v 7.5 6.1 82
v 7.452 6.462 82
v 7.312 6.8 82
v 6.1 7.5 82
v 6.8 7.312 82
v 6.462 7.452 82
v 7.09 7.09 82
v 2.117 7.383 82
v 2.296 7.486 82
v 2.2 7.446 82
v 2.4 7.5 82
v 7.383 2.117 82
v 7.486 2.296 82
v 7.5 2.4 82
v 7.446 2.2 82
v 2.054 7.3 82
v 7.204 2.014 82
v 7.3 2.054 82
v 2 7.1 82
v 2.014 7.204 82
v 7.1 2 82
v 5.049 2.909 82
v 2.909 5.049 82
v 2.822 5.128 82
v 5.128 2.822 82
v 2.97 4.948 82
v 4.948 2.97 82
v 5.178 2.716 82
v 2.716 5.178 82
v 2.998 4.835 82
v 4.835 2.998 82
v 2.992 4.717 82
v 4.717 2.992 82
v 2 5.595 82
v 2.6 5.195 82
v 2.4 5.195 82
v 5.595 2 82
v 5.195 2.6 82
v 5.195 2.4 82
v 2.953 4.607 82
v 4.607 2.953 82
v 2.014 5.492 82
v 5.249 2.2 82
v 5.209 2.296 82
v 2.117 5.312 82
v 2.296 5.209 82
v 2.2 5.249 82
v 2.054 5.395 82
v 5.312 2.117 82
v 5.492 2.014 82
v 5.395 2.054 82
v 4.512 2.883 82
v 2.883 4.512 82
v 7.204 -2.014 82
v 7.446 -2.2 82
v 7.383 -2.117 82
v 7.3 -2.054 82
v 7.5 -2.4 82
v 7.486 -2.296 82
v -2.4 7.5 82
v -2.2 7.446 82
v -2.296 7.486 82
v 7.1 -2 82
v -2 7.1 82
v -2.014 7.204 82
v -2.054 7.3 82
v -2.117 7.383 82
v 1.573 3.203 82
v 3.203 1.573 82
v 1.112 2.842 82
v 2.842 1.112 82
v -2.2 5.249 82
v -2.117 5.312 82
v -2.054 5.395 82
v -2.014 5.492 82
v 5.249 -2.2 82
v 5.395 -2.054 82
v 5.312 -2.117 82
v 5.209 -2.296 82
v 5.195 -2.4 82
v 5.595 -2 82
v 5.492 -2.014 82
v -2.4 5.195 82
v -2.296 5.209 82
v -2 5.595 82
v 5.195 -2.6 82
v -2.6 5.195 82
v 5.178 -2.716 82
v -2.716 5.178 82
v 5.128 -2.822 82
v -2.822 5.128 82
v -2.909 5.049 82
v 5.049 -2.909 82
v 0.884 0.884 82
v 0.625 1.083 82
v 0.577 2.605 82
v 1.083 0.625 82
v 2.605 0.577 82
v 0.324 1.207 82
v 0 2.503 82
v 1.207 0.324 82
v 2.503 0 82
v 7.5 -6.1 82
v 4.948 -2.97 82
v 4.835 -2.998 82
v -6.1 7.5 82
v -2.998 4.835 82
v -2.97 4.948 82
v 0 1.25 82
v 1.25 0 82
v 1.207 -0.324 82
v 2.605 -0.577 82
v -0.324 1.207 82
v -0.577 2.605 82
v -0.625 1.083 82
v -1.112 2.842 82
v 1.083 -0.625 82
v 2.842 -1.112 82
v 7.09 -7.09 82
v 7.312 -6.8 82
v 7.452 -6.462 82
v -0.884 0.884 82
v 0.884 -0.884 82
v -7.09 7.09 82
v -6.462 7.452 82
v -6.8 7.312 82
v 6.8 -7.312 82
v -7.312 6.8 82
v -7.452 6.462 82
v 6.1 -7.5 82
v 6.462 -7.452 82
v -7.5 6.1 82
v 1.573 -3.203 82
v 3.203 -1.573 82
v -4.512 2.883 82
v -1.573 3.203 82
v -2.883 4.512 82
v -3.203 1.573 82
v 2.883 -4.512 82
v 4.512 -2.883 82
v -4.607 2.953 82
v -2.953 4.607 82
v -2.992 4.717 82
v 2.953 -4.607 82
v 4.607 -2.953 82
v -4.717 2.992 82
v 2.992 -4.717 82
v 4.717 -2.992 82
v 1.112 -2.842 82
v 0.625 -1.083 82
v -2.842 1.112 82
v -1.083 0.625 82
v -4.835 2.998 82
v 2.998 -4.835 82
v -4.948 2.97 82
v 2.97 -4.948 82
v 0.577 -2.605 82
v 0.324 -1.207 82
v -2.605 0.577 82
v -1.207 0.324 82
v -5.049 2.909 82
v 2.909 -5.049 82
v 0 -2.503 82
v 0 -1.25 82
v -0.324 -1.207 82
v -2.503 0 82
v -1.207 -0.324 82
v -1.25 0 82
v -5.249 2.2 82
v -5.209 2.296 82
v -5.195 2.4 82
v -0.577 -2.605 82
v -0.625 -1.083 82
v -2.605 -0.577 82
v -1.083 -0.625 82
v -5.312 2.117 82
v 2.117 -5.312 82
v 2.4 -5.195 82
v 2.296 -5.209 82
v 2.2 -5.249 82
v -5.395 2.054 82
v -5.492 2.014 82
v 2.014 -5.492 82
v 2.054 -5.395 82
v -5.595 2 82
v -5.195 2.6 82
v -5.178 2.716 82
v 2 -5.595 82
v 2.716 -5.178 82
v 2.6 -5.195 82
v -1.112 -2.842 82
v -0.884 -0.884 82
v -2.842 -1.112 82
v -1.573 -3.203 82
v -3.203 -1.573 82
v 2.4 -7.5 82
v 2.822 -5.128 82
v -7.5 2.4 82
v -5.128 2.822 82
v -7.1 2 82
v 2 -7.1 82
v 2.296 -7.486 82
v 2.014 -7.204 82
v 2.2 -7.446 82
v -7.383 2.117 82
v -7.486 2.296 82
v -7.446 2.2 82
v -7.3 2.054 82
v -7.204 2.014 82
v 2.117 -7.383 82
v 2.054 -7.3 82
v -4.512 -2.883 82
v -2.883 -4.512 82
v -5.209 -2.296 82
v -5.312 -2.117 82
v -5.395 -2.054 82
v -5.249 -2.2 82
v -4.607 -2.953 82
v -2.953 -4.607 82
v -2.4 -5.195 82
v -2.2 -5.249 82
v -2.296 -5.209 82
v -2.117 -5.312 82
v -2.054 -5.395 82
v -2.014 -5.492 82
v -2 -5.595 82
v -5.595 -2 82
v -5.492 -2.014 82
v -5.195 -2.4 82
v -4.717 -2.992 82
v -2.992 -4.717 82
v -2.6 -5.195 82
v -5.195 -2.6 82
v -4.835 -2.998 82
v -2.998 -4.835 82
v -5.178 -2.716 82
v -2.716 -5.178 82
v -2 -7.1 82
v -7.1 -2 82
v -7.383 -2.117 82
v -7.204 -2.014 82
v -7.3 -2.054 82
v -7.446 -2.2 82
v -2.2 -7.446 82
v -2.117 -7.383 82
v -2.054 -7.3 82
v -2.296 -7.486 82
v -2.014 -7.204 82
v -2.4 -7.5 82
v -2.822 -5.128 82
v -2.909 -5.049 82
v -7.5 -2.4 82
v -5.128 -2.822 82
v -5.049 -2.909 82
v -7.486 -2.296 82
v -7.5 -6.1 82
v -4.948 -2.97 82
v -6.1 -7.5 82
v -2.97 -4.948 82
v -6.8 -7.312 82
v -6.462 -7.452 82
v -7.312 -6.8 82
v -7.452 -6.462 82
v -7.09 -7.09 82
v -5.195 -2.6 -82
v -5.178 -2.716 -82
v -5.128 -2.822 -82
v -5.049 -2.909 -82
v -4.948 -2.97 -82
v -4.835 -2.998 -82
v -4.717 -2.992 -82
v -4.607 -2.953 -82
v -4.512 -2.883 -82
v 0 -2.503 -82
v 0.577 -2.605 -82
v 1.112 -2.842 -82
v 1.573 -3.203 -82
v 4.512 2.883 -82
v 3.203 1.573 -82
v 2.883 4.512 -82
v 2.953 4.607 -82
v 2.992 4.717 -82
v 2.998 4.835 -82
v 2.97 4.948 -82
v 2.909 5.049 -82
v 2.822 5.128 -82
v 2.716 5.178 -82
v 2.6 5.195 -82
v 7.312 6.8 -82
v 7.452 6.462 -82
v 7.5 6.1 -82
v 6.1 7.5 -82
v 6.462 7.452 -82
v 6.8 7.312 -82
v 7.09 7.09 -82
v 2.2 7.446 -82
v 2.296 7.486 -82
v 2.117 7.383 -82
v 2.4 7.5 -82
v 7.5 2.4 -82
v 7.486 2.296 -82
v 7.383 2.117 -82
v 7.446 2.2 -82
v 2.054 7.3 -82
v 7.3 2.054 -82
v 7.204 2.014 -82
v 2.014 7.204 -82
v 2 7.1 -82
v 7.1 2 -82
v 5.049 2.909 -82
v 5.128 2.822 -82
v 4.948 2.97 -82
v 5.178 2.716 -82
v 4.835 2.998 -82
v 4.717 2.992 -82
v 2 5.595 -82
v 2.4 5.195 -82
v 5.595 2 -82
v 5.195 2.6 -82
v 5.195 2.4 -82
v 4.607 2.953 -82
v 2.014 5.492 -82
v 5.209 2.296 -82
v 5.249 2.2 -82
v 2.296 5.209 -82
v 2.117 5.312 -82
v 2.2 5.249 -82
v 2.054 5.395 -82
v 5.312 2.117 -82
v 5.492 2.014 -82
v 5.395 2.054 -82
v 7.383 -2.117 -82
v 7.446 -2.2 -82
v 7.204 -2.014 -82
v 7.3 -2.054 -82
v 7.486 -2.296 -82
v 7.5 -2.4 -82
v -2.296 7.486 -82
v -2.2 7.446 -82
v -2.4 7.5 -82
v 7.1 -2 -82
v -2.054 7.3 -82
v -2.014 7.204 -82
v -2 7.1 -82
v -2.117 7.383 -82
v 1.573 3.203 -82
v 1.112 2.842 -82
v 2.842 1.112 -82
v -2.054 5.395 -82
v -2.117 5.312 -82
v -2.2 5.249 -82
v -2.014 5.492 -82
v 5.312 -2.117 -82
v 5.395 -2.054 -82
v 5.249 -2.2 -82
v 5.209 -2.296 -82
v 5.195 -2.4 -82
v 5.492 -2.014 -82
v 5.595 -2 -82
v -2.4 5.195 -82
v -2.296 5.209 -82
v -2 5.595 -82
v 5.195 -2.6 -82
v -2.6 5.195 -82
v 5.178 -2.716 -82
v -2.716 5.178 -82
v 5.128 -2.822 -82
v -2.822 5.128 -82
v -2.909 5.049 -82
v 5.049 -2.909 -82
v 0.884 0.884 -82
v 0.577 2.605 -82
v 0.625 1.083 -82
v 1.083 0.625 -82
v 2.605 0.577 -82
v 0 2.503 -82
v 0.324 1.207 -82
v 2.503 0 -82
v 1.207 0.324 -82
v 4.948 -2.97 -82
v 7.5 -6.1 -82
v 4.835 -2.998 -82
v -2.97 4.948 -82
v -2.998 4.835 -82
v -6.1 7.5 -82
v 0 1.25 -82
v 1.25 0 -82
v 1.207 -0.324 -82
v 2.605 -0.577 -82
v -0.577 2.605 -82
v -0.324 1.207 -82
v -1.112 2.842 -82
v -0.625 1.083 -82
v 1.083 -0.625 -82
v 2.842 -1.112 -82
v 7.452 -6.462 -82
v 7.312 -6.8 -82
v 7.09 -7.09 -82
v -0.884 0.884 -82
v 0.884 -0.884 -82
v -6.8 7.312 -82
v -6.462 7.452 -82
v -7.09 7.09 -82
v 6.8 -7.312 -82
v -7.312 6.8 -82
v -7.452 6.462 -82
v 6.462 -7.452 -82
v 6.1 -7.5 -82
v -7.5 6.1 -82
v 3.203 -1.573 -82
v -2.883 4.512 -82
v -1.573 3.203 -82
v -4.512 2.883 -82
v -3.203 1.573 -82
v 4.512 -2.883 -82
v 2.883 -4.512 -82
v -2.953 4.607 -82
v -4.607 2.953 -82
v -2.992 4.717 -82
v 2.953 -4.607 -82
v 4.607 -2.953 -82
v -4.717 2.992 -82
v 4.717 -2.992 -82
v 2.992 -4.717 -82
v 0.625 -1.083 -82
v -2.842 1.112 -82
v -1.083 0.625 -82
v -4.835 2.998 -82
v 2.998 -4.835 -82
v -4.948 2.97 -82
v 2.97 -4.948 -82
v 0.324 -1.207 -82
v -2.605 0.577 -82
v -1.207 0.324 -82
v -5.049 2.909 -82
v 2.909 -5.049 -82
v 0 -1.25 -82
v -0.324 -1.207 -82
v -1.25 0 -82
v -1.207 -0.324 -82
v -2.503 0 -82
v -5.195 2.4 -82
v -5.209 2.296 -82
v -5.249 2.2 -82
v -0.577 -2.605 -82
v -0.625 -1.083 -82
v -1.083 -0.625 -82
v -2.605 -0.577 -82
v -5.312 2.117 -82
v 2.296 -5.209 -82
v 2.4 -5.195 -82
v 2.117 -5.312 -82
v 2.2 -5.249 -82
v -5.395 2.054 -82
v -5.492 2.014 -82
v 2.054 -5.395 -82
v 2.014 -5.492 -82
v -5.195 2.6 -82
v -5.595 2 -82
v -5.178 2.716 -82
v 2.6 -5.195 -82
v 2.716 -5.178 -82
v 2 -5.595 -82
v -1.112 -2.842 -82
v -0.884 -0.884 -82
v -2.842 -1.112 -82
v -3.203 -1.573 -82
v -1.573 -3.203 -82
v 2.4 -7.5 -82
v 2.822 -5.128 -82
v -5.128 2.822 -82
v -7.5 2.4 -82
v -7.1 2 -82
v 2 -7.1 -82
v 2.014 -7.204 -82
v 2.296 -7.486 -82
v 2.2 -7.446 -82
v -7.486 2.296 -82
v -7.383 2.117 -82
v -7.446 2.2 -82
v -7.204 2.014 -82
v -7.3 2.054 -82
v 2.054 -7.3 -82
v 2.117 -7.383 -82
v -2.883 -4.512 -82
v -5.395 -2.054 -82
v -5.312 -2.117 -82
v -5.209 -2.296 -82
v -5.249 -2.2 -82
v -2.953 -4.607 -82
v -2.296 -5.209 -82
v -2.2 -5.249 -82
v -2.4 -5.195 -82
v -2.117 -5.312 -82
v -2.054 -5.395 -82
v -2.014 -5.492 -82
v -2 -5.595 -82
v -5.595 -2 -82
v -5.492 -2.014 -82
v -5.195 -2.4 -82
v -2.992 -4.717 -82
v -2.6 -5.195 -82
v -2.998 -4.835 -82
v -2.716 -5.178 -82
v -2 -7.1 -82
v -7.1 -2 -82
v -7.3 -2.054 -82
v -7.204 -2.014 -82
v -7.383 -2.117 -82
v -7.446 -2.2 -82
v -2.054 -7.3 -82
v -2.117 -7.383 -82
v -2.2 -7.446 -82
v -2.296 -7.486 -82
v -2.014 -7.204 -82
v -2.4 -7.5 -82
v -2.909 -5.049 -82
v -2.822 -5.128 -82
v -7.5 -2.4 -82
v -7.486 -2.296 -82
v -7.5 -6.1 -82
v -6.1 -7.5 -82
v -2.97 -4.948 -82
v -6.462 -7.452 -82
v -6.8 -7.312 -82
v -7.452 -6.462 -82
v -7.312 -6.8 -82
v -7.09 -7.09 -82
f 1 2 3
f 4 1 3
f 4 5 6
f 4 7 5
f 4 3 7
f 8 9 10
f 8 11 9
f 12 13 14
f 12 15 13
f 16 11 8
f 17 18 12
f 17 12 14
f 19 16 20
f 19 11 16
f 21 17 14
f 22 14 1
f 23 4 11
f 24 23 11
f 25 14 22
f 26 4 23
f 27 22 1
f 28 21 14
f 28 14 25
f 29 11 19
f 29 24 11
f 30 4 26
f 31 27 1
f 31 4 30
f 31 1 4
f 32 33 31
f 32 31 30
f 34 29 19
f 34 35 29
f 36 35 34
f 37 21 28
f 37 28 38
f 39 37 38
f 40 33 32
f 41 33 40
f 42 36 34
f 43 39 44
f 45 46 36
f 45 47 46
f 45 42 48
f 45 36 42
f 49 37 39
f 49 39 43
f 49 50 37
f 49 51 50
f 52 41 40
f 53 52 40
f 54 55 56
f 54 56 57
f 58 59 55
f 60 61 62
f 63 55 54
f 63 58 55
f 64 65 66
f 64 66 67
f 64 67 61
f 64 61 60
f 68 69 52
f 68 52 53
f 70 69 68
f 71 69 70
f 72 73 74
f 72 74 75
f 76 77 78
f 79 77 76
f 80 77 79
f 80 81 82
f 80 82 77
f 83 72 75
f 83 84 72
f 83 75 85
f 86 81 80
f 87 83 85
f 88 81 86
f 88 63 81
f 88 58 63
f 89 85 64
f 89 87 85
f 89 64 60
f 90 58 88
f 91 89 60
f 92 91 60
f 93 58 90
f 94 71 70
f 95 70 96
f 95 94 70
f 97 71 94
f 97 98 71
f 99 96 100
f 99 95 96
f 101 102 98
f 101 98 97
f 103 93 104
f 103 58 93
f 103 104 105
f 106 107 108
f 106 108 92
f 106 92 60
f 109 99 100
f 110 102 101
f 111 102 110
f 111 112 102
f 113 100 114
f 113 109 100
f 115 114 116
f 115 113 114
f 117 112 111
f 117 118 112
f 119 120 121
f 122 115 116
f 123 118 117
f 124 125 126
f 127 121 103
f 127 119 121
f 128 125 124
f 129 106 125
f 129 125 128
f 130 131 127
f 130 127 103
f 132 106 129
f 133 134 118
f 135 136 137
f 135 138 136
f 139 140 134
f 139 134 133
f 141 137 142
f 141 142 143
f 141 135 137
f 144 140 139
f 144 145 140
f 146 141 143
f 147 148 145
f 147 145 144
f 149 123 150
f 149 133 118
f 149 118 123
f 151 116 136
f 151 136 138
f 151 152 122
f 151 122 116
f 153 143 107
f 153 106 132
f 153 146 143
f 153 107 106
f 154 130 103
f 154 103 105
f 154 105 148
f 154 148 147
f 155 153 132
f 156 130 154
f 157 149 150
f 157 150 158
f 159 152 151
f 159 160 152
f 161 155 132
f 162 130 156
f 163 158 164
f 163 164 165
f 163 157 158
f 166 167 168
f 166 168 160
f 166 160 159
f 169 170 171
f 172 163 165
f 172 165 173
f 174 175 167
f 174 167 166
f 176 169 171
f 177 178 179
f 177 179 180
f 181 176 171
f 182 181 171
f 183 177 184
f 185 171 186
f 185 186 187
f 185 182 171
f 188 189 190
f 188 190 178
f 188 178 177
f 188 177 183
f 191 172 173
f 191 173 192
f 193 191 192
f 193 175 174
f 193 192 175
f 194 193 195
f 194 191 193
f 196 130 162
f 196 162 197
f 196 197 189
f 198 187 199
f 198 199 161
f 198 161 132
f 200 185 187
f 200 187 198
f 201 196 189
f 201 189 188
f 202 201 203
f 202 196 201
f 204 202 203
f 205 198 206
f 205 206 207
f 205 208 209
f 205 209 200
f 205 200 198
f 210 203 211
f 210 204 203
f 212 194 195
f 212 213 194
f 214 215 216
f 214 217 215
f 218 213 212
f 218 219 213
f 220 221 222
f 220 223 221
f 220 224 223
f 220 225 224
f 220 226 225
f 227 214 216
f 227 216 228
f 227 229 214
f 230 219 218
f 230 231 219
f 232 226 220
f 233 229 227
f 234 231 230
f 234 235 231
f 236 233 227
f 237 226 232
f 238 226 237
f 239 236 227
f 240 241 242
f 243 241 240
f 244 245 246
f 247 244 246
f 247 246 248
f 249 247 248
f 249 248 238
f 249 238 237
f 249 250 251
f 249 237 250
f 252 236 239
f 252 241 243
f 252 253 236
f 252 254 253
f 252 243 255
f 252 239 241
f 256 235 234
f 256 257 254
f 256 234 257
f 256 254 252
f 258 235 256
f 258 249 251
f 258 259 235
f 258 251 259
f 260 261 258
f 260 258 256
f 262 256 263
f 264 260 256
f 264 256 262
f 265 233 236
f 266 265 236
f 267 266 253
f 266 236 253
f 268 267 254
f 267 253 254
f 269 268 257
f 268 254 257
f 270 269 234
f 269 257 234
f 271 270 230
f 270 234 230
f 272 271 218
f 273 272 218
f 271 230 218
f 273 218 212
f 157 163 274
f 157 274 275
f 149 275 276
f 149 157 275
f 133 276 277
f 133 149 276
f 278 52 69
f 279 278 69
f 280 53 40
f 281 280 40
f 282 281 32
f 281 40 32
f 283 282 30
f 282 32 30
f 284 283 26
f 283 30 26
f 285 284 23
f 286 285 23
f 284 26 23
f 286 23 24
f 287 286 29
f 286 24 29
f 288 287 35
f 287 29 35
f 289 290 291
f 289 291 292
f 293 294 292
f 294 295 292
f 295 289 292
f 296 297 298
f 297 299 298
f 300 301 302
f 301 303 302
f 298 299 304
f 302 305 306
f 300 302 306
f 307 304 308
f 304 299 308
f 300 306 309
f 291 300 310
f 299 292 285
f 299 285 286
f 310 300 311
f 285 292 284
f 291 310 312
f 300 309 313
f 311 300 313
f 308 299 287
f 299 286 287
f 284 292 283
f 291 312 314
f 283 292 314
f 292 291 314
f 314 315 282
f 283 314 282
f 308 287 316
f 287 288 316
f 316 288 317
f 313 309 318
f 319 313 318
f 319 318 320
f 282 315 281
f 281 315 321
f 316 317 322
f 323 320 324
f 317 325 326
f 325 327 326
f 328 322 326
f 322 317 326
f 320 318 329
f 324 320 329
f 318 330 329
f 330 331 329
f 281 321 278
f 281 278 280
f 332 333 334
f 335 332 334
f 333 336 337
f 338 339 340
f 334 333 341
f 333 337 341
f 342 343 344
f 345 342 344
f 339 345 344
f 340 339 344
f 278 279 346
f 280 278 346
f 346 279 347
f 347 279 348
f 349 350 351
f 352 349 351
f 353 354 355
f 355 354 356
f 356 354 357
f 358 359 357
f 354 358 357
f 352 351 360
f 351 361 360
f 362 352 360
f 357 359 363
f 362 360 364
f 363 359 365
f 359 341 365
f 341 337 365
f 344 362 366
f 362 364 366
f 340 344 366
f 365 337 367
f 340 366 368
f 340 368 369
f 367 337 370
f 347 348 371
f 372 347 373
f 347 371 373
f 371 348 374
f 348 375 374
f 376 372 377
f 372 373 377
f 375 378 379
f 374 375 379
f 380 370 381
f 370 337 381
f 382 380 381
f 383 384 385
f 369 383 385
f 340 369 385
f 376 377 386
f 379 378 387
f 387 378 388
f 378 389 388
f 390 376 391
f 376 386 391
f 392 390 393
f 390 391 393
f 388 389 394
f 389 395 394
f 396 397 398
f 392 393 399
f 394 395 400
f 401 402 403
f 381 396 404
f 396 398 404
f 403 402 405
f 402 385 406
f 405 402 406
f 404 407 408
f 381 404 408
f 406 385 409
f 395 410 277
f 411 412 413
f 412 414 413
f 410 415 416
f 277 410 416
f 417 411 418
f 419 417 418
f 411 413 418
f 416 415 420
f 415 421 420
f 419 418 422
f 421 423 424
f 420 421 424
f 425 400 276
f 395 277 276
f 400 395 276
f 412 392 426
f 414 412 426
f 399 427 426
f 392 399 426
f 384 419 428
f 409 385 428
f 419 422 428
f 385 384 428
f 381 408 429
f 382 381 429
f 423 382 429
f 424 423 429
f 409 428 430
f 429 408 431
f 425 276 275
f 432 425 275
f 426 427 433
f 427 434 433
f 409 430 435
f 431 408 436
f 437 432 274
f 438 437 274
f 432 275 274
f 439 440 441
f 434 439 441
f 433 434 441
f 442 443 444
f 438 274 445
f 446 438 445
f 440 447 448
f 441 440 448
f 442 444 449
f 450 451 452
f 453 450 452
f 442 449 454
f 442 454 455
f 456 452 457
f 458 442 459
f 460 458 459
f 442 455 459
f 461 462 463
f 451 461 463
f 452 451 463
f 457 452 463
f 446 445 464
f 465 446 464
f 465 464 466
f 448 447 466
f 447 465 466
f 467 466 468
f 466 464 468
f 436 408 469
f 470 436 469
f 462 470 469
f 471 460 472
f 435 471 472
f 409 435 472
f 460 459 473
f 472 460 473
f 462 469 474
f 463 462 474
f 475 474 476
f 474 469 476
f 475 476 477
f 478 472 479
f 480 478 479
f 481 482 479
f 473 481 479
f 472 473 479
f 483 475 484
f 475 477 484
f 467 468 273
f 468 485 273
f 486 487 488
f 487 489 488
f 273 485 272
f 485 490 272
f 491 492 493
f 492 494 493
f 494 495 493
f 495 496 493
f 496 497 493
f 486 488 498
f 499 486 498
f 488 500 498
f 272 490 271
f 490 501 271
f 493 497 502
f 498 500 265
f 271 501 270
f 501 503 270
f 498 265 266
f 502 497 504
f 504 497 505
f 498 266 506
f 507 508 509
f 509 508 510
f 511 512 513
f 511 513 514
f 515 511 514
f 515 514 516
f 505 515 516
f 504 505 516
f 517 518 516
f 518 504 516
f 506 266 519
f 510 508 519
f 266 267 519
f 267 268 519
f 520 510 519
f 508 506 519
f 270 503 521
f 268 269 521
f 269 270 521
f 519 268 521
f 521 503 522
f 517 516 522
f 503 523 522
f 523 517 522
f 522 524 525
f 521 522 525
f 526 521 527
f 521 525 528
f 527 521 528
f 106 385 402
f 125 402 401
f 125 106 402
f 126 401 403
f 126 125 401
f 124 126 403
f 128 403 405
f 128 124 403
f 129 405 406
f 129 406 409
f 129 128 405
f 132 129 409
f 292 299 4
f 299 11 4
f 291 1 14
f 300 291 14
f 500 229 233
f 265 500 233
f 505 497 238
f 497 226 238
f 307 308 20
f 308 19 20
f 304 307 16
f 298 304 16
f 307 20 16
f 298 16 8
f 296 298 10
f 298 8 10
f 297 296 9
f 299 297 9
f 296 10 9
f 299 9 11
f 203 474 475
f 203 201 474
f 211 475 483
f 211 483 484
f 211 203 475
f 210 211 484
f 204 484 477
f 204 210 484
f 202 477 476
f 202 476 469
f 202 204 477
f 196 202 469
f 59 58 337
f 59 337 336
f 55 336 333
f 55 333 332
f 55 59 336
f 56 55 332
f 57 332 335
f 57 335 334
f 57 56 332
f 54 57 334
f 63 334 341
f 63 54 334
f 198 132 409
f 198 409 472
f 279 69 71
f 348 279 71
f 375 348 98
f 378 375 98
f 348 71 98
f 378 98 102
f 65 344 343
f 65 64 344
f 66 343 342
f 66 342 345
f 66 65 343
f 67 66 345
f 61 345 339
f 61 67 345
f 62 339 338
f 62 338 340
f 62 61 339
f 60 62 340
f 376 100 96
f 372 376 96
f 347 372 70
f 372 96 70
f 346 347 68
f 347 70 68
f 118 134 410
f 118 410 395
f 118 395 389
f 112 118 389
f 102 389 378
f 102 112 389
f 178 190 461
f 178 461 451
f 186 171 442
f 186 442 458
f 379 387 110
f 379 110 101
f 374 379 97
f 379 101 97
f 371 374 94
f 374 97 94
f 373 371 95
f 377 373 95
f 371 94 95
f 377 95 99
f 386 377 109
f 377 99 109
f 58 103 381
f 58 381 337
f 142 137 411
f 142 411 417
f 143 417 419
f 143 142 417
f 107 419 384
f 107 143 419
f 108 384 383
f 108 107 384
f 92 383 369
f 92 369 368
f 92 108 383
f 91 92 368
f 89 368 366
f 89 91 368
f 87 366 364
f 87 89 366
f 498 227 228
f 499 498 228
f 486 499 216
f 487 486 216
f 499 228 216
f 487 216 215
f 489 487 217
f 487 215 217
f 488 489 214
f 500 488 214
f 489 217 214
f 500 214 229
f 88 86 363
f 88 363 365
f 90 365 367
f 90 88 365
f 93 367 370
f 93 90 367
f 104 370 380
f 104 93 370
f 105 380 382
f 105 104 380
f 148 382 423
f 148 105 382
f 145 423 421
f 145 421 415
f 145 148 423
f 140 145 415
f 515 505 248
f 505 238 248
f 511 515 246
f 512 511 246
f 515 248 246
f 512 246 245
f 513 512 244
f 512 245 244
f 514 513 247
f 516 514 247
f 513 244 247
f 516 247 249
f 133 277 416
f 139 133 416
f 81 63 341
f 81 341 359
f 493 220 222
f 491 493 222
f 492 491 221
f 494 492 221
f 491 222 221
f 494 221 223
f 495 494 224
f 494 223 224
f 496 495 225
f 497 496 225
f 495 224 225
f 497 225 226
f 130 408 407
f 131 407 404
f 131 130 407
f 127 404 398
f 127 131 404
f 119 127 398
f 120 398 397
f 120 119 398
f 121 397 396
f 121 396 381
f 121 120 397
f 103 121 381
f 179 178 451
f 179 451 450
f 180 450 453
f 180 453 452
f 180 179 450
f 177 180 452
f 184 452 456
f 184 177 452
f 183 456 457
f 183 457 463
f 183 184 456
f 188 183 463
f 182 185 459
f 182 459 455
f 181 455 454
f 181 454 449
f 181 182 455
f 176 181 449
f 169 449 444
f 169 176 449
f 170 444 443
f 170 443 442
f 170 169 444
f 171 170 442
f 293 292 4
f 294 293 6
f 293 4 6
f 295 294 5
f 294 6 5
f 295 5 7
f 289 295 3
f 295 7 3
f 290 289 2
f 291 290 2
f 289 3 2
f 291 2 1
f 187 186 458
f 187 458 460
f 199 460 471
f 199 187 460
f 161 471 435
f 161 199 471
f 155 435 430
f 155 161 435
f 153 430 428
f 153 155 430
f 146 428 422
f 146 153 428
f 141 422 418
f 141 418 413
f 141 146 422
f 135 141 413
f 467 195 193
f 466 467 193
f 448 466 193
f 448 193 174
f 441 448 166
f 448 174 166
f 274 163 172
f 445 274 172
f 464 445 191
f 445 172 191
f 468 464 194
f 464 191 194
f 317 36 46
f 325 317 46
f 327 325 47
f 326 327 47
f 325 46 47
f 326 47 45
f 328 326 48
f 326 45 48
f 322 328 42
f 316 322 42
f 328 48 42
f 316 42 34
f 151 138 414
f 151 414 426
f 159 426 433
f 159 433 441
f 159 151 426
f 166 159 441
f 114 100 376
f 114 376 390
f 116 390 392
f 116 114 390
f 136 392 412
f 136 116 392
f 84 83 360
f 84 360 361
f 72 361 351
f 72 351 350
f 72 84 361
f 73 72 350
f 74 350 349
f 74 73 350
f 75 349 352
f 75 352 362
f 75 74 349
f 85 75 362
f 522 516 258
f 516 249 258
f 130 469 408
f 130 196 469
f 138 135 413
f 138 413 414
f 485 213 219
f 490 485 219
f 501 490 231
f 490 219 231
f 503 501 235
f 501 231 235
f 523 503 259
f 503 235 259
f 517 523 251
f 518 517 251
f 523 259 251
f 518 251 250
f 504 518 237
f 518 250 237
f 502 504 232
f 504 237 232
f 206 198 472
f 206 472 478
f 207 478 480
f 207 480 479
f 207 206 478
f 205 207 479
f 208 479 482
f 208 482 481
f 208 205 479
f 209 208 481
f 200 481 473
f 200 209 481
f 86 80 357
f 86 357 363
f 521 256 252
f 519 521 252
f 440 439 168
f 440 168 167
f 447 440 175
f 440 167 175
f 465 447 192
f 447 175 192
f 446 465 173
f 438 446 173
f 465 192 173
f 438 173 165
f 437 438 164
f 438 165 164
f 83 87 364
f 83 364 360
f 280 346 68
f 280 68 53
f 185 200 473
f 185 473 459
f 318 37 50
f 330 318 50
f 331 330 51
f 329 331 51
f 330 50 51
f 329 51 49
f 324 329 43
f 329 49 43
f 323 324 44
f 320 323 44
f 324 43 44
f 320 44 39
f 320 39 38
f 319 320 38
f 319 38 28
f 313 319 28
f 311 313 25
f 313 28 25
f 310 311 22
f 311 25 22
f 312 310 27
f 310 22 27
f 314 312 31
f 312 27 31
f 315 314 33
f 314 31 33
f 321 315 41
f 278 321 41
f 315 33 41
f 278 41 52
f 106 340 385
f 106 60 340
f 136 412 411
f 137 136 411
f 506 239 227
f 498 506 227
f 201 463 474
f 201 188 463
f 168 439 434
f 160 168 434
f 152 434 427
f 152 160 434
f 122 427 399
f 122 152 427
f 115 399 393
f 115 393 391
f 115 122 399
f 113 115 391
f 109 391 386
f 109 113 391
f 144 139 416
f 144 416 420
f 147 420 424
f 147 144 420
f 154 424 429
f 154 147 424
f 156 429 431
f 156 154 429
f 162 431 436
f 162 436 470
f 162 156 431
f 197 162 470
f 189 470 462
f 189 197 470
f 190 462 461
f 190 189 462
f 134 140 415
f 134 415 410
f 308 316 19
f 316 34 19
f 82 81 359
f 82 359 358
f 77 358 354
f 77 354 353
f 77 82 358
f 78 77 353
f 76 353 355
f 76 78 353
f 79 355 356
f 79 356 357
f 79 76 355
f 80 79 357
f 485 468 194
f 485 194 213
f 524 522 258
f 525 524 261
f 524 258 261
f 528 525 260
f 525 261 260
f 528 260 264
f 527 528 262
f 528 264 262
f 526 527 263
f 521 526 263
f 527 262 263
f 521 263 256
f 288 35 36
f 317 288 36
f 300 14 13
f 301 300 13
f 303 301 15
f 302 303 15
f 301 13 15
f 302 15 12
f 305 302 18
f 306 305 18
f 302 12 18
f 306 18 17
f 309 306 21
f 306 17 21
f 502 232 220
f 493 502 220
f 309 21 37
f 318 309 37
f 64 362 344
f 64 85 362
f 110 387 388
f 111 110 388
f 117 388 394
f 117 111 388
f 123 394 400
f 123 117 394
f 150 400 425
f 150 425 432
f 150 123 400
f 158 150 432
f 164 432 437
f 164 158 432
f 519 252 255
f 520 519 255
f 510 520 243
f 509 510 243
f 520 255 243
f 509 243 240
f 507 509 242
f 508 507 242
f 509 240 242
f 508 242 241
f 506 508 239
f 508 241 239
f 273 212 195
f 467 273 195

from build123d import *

# Parameters (mm, degrees)
BOSS_EXTRUDE1_DEPTH = 82


with BuildPart() as part:
    # Sketch4 → Boss-Extrude1 (new body, symmetric)
    with BuildSketch(Plane.XY):
        with BuildLine():
            Line((2.4, -7.5), (6.1, -7.5))
            ThreePointArc((6.1, -7.5), (7.089949494, -7.089949494), (7.5, -6.1))
            Line((7.5, -6.1), (7.5, -2.4))
            ThreePointArc((7.5, -2.4), (7.382842712, -2.117157288), (7.1, -2))
            Line((7.1, -2), (5.595331881, -2))
            ThreePointArc((5.595331881, -2), (5.312489168, -2.117157288), (5.195331881, -2.4))
            Line((5.195331881, -2.4), (5.195331881, -2.6))
            ThreePointArc((5.195331881, -2.6), (4.948405254, -2.969551813), (4.512489168, -2.882842712))
            Line((4.512489168, -2.882842712), (3.202943725, -1.57329727))
            ThreePointArc((3.202943725, -1.57329727), (2.682689122, -0.794681232), (2.5, 0.123759005))
            Line((2.5, 0.123759005), (2.5, 0))
            Line((2.5, 0), (1.25, 0))
            ThreePointArc((1.25, 0), (0.883883476, -0.883883476), (0, -1.25))
            Line((0, -1.25), (0, -2.5))
            Line((0, -2.5), (-0.123759005, -2.5))
            ThreePointArc((-0.123759005, -2.5), (0.794681232, -2.682689122), (1.57329727, -3.202943725))
            Line((1.57329727, -3.202943725), (2.882842712, -4.512489168))
            ThreePointArc((2.882842712, -4.512489168), (2.969551813, -4.948405254), (2.6, -5.195331881))
            Line((2.6, -5.195331881), (2.4, -5.195331881))
            ThreePointArc((2.4, -5.195331881), (2.117157288, -5.312489168), (2, -5.595331881))
            Line((2, -5.595331881), (2, -7.1))
            ThreePointArc((2, -7.1), (2.117157288, -7.382842712), (2.4, -7.5))
        make_face()
    extrude(amount=BOSS_EXTRUDE1_DEPTH, both=True)

    # Mirror1: part across plane


with BuildPart() as part_1:
    add(part.part)
    add(part.part.mirror(Plane(origin=(0, 0, 0), x_dir=(0, 0, 1), z_dir=(1, 0, 0))))

    # Mirror2: part across plane


with BuildPart() as part_2:
    add(part_1.part)
    add(part_1.part.mirror(Plane.ZX))


solid = part_2.part
